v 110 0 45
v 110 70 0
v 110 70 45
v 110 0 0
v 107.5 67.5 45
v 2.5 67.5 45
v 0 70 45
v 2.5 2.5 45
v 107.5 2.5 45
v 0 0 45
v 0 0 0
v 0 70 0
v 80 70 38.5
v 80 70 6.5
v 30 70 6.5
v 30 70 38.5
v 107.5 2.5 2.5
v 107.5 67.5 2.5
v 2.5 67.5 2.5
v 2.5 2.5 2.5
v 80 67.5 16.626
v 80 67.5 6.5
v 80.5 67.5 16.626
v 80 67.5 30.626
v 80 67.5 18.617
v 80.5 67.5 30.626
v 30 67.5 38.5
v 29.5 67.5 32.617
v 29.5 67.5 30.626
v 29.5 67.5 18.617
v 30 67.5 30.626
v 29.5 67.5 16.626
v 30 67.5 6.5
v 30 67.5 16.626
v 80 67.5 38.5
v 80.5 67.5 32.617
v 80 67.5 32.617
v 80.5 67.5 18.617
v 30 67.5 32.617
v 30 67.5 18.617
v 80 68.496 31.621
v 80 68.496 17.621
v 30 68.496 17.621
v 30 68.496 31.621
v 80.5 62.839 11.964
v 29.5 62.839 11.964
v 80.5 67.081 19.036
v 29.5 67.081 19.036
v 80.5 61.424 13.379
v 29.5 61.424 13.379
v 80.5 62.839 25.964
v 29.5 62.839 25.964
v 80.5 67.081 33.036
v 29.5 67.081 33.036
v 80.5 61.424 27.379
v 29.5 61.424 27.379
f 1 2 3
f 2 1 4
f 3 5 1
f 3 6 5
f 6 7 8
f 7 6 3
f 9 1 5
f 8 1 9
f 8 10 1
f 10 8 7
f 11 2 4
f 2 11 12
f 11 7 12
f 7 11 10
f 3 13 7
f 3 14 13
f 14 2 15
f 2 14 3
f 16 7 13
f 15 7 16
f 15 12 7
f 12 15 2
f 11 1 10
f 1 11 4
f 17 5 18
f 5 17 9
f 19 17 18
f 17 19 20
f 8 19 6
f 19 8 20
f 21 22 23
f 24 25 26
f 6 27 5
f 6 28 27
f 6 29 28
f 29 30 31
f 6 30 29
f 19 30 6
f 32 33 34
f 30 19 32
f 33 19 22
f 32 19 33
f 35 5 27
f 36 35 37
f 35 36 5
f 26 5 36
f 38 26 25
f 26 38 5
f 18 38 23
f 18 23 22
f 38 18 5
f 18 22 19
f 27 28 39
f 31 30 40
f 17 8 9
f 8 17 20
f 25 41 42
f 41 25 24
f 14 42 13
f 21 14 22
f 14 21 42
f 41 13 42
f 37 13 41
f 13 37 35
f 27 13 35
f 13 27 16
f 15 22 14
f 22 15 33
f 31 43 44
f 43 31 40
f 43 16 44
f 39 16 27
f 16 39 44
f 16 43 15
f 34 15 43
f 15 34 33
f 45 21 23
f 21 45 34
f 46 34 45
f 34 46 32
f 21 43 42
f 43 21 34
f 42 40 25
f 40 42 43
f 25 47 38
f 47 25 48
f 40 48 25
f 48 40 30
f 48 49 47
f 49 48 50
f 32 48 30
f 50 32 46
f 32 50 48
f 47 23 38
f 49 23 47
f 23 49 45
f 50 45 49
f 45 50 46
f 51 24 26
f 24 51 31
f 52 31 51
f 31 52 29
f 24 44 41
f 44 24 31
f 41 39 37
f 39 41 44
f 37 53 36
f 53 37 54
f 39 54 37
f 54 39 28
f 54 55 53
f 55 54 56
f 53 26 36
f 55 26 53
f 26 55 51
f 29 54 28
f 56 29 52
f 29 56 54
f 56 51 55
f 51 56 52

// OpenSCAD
$fn = 32;

// ----------------------------------------------------------------------
// Vent box: louvers enclosure
// ----------------------------------------------------------------------

// --- parameters (mm) ---
box_l = 110;              // box length, X
box_w = 70;               // box width, Y
box_h = 45;               // box height, Z
wall_t = 2.5;             // shell wall thickness
win_l = 50;               // vent window width, X
win_h = 32;               // vent window height, Z
slat_t = 2;               // louver slat thickness
slat_d = 8;               // louver slat depth
slat_a = 45;              // louver slat angle, degrees
slat_pitch = 14;          // louver pitch
slat_yc = 64.96;          // slat centreline Y

win_z0 = (box_h - win_h) / 2;  // window lower edge Z
n_slats = 2;  // louver count
slat_z0 = win_z0 + (win_h - (n_slats - 1) * slat_pitch) / 2;

difference() {
  union() {
    difference() {
      cube([box_l, box_w, box_h]);
  translate([wall_t, wall_t, wall_t])
    cube([box_l - 2 * wall_t, box_w - 2 * wall_t, box_h]);
  translate([(box_l - win_l) / 2, box_w - wall_t - 1, win_z0])
    cube([win_l, wall_t + 2, win_h]);
    }
    for (i = [0 : n_slats - 1])
      translate([box_l / 2, slat_yc, slat_z0 + i * slat_pitch])
        rotate([slat_a, 0, 0])
          cube([win_l + 1, slat_d, slat_t], center = true);
  }
}
